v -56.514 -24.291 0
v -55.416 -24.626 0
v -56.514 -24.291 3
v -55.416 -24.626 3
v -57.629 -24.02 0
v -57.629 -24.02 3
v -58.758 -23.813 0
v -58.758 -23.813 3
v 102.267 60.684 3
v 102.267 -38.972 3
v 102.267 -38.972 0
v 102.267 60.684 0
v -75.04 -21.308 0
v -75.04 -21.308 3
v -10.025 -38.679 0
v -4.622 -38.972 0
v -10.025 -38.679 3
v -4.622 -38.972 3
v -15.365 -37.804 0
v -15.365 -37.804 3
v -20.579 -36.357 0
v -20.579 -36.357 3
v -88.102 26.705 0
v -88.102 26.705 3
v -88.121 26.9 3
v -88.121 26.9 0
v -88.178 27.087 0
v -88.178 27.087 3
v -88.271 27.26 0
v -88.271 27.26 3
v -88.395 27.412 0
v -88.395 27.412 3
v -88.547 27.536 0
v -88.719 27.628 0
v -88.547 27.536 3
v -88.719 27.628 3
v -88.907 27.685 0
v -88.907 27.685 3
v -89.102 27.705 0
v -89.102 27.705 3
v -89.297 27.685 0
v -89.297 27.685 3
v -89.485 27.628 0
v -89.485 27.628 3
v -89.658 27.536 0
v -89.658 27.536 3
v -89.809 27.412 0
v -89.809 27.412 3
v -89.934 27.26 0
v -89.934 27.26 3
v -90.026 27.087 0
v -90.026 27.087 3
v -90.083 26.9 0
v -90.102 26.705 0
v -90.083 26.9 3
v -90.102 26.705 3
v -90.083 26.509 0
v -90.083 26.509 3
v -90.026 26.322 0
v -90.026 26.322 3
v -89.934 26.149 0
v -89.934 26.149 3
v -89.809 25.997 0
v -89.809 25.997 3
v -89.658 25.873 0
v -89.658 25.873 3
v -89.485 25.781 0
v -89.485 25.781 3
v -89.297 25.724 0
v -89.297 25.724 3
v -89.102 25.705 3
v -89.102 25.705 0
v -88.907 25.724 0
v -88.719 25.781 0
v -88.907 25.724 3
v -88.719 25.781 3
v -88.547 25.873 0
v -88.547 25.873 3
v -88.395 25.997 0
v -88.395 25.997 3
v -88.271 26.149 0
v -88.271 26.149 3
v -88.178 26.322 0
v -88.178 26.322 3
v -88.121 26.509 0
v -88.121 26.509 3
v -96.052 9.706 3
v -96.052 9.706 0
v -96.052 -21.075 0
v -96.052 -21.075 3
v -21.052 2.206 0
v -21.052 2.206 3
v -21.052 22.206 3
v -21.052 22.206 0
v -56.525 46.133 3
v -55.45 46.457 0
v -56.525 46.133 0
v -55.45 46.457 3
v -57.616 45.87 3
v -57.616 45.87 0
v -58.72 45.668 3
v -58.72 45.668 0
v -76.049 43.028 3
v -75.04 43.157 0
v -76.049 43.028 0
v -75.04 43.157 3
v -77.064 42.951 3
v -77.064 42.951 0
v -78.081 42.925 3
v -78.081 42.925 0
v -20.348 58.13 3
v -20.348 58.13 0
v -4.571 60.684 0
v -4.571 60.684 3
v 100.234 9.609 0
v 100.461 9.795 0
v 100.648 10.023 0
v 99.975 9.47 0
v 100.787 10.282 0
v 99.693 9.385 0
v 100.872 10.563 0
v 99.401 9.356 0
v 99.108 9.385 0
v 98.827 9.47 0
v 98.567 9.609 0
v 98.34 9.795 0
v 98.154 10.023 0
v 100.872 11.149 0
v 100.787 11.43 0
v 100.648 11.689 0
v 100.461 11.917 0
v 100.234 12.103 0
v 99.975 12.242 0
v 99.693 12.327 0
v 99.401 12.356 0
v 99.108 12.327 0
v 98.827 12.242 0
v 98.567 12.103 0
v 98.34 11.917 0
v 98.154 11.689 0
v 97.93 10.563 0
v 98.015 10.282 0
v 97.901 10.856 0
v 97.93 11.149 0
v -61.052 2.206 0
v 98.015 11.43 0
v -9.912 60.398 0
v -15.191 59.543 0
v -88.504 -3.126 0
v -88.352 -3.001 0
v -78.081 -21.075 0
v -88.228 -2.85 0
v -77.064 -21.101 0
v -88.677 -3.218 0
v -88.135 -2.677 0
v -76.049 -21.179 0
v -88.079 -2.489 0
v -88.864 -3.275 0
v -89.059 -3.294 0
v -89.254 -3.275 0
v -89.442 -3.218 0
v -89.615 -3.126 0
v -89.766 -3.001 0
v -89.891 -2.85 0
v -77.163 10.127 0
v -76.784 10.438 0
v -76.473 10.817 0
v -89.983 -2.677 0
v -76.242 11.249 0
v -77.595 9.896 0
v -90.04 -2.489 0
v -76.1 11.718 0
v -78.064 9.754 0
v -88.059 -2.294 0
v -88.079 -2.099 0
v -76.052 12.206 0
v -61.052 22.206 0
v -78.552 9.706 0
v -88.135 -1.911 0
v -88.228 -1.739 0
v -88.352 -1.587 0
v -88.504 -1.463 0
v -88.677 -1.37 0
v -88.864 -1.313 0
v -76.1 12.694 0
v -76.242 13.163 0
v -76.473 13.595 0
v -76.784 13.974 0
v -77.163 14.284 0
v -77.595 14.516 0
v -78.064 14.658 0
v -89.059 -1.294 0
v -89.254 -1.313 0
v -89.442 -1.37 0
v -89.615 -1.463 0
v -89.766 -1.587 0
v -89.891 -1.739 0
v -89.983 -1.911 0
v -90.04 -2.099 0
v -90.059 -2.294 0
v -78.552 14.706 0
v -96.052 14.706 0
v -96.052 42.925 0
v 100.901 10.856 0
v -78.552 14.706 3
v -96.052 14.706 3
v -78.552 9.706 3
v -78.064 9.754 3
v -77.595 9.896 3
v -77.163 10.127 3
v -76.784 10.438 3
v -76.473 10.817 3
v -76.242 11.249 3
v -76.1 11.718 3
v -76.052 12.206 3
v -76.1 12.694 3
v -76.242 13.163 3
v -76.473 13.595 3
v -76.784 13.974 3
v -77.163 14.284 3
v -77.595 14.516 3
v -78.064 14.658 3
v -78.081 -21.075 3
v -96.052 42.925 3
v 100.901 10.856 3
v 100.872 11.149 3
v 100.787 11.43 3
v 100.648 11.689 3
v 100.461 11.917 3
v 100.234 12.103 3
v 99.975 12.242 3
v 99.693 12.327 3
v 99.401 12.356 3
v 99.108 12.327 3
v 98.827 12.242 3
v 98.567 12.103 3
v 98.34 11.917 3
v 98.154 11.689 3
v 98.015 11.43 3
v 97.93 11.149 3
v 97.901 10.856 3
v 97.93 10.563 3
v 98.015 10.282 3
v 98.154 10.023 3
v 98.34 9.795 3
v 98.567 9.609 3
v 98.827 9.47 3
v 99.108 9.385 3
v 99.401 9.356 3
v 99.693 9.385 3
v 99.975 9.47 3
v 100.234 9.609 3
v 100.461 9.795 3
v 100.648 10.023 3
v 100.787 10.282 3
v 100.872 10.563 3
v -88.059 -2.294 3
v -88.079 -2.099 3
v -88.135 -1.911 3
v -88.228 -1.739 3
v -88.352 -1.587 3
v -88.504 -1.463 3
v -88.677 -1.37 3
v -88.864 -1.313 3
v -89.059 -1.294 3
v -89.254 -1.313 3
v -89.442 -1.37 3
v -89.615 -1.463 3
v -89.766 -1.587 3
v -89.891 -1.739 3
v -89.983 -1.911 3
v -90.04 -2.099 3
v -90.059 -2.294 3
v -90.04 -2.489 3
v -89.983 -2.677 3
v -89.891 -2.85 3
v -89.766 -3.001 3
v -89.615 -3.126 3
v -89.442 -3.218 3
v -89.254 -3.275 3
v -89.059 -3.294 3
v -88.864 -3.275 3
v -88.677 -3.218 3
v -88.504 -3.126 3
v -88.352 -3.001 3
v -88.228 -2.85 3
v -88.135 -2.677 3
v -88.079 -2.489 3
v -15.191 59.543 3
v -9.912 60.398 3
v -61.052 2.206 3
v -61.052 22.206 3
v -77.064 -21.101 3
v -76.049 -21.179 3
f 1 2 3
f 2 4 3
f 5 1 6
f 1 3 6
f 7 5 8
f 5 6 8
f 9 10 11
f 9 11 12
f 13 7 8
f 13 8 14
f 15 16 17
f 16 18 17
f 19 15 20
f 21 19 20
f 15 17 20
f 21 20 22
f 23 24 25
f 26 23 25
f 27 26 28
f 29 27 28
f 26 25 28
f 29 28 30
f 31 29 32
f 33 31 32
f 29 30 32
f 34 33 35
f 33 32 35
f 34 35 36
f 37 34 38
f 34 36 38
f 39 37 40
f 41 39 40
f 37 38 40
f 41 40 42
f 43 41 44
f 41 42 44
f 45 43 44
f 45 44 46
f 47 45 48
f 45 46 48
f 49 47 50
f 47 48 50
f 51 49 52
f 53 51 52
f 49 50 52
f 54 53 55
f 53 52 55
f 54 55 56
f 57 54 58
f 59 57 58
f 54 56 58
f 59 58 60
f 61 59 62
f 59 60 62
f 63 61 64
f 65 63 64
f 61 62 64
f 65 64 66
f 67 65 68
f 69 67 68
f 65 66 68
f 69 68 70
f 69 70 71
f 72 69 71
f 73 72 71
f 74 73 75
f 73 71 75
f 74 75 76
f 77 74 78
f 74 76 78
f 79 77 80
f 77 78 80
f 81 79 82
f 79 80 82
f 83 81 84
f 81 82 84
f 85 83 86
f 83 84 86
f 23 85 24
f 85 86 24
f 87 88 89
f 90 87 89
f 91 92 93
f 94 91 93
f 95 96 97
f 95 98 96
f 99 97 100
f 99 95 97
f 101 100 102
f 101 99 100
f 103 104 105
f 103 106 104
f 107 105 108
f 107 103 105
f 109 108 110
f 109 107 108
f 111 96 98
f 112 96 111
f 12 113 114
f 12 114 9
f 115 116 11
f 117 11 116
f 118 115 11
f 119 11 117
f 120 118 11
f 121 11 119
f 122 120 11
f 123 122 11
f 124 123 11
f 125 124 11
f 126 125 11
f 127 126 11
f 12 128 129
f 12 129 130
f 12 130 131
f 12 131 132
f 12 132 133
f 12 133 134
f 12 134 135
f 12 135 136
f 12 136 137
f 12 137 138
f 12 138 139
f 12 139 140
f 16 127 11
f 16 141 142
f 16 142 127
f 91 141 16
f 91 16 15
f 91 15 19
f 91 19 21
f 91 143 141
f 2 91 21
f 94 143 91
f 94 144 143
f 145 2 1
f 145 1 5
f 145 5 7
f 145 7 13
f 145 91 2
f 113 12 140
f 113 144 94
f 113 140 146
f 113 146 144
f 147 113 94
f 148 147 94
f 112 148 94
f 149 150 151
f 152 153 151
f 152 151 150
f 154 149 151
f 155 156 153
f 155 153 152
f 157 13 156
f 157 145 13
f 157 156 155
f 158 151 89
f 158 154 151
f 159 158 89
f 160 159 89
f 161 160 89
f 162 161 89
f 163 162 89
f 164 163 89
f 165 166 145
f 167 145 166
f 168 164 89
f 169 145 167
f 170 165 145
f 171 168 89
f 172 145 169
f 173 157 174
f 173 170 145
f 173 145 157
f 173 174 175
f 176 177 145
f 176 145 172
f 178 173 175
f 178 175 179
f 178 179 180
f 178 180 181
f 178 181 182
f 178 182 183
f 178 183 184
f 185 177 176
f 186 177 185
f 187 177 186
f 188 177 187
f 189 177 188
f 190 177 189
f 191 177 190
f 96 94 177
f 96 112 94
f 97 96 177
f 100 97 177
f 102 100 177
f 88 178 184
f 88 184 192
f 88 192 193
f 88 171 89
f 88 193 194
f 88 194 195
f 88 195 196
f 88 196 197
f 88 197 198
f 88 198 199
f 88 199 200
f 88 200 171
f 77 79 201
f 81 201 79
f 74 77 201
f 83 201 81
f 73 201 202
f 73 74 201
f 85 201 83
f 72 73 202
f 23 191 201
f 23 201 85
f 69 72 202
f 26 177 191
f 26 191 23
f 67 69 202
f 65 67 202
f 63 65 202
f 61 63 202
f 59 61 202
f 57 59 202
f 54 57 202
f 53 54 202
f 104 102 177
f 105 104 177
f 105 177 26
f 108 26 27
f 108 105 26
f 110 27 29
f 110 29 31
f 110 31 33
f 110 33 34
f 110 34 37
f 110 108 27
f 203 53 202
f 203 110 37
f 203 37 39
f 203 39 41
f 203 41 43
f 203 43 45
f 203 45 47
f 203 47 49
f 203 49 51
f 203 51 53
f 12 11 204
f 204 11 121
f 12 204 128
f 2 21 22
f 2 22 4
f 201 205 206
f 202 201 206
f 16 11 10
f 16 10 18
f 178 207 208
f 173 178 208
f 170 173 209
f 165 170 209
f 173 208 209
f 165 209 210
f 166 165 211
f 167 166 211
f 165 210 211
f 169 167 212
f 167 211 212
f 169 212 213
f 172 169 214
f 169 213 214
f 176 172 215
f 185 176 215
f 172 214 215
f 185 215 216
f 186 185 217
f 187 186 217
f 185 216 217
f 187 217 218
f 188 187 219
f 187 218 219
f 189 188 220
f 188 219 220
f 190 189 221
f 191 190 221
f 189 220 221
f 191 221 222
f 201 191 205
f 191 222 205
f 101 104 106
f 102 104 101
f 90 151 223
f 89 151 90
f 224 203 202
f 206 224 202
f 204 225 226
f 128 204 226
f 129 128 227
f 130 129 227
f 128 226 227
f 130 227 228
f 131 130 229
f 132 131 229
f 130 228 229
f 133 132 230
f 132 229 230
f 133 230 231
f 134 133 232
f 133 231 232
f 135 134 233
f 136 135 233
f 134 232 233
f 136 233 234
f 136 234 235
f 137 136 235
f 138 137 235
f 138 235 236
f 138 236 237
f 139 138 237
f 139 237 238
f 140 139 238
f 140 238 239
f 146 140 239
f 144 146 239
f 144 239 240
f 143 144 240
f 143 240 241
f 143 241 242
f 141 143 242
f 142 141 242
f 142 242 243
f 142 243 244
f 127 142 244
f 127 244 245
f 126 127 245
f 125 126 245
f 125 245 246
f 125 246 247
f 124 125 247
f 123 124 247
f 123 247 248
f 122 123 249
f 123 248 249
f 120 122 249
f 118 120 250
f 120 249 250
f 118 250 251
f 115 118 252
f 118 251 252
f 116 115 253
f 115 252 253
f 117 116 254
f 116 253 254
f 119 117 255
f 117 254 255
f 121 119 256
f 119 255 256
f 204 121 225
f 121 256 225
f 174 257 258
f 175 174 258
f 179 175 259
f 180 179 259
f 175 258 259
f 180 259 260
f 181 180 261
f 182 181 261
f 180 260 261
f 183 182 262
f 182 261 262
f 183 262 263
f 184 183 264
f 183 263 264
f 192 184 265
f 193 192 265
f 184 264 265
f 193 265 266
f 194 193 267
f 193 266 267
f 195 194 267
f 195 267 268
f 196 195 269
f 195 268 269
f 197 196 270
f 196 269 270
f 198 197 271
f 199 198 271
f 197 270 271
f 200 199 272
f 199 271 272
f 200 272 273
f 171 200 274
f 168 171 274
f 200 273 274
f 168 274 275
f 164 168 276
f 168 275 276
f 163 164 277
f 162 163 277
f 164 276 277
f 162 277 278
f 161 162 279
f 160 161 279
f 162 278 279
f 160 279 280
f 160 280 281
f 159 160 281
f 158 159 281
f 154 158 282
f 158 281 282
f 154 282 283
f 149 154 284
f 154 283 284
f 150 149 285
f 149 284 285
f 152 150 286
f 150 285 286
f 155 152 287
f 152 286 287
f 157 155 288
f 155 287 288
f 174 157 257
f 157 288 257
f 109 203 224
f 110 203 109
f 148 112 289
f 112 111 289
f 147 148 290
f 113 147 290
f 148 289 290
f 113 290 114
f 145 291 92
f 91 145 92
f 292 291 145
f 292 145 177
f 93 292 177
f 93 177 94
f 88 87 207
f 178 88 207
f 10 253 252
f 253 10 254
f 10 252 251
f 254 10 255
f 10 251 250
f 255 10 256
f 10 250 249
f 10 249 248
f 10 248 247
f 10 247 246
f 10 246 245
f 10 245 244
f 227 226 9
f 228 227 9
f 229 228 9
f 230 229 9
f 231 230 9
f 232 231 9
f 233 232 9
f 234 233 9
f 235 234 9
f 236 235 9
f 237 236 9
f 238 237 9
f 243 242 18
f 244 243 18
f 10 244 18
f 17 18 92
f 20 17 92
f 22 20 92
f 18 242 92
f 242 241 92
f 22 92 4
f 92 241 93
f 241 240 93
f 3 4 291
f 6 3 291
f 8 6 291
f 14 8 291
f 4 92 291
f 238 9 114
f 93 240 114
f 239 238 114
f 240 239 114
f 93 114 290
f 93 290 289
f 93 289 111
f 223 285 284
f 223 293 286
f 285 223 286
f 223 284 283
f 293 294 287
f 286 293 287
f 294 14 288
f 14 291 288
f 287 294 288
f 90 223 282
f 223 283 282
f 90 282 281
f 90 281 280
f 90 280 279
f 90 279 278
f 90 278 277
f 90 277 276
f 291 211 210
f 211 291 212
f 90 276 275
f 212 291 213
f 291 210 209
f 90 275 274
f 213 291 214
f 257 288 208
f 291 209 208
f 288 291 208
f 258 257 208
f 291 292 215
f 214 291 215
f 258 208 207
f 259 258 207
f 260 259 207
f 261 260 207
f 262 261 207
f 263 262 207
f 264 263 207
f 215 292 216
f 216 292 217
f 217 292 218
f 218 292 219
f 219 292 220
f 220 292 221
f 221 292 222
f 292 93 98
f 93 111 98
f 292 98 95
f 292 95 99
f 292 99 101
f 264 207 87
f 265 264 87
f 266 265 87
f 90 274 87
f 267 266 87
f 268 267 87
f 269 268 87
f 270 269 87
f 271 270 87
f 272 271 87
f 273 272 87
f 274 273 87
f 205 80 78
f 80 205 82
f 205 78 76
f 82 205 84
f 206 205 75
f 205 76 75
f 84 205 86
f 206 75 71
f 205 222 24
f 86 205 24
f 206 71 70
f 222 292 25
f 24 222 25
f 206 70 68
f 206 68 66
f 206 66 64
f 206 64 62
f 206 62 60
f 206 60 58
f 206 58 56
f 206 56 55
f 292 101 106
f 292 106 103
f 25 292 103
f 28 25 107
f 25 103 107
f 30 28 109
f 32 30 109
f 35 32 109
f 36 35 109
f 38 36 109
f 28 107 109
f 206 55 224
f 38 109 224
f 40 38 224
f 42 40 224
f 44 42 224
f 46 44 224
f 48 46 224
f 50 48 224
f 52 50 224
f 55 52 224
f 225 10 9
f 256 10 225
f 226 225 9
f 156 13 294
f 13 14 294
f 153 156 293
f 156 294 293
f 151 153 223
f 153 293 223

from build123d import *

# Parameters (mm, degrees)
RESSALTO_EXTRUS_O2_DEPTH = 3
FILETE4_R                = 50
FILETE6_R                = 20
ESBO_O3_R                = 1.000396488
CORTE_EXTRUS_O1_DEPTH    = 3
ESBO_O4_R                = 2.5
CORTE_EXTRUS_O3_DEPTH    = 3
ESBO_O5_R                = 1
CORTE_EXTRUS_O4_DEPTH    = 3
ESBO_O6_W                = 28
ESBO_O6_H                = 99.656129788
CORTE_EXTRUS_O5_DEPTH    = 10
ESBO_O7_R                = 1.5
CORTE_EXTRUS_O6_DEPTH    = 10
ESBO_O8_W                = 40
ESBO_O8_H                = 20
CORTE_EXTRUS_O7_DEPTH    = 10


with BuildPart() as part:
    # Esboço1 → Ressalto-extrusão2 (new body)
    with BuildSketch(Plane.XY):
        Polygon((130.267029072, 60.684036759), (130.267029072, -38.972093029), (-12.814839489, -38.972093029), (-57.051670623, -24.075187779), (-76.551670623, -21.075187779), (-96.051670623, -21.075187779), (-96.051670623, -19.075187779), (-96.051670623, 10.924812221), (-96.051670623, 40.924812221), (-96.051670623, 42.924812221), (-76.551670623, 42.924812221), (-57.051670623, 45.924812221), (-12.66677951, 60.684036759), align=None)
    extrude(amount=RESSALTO_EXTRUS_O2_DEPTH)

    # Filete4
    filete4_edges = [part.edges().sort_by_distance(p)[0] for p in [
        (-12.814839489, -38.972093029, 1.5),
        (-12.66677951, 60.684036759, 1.5),
    ]]
    fillet(filete4_edges, radius=FILETE4_R)

    # Filete6
    filete6_edges = [part.edges().sort_by_distance(p)[0] for p in [
        (-57.051670623, -24.075187779, 1.5),
        (-76.551670623, -21.075187779, 1.5),
        (-76.551670623, 42.924812221, 1.5),
        (-57.051670623, 45.924812221, 1.5),
    ]]
    fillet(filete6_edges, radius=FILETE6_R)

    # Esboço3 → Corte-extrusão1 (cut)
    with BuildSketch(Plane.XY.offset(3)):
        with Locations((127.267029072, 10.855971865)):
            Circle(ESBO_O3_R)
    extrude(amount=-CORTE_EXTRUS_O1_DEPTH, mode=Mode.SUBTRACT)

    # Esboço4 → Corte-extrusão3 (cut)
    with BuildSketch(Plane.XY.offset(3)):
        with BuildLine():
            Line((-78.551670623, 14.705809502), (-96.051670623, 14.705809502))
            Line((-96.051670623, 14.705809502), (-96.051670623, 12.205809502))
            Line((-96.051670623, 12.205809502), (-81.051670623, 12.205809502))
            ThreePointArc((-81.051670623, 12.205809502), (-80.319437576, 13.973576455), (-78.551670623, 14.705809502))
        make_face()
        with BuildLine():
            Line((-81.051670623, 12.205809502), (-96.051670623, 12.205809502))
            Line((-96.051670623, 12.205809502), (-96.051670623, 9.705809502))
            Line((-96.051670623, 9.705809502), (-78.551670623, 9.705809502))
            ThreePointArc((-78.551670623, 9.705809502), (-80.319437576, 10.438042549), (-81.051670623, 12.205809502))
        make_face()
        with Locations((-78.551670623, 12.205809502)):
            Circle(ESBO_O4_R)
    extrude(amount=-CORTE_EXTRUS_O3_DEPTH, mode=Mode.SUBTRACT)

    # Esboço5 → Corte-extrusão4 (cut)
    with BuildSketch(Plane.XY.offset(3)):
        with Locations((-89.059378868, -2.294160789)):
            Circle(ESBO_O5_R)
        with Locations((-89.102120748, 26.704536083)):
            Circle(ESBO_O5_R)
    extrude(amount=-CORTE_EXTRUS_O4_DEPTH, mode=Mode.SUBTRACT)

    # Esboço6 → Corte-extrusão5 (cut)
    with BuildSketch(Plane.XY.offset(3)):
        with Locations((116.267029072, 10.855971865)):
            Rectangle(ESBO_O6_W, ESBO_O6_H)
    extrude(amount=-CORTE_EXTRUS_O5_DEPTH, mode=Mode.SUBTRACT)

    # Esboço7 → Corte-extrusão6 (cut)
    with BuildSketch(Plane.XY.offset(3)):
        with Locations((99.400721929, 10.855971865)):
            Circle(ESBO_O7_R)
    extrude(amount=-CORTE_EXTRUS_O6_DEPTH, mode=Mode.SUBTRACT)

    # Esboço8 → Corte-extrusão7 (cut)
    with BuildSketch(Plane.XY.offset(3)):
        with Locations((-41.051670623, 12.205809502)):
            Rectangle(ESBO_O8_W, ESBO_O8_H)
    extrude(amount=-CORTE_EXTRUS_O7_DEPTH, mode=Mode.SUBTRACT)


solid = part.part
